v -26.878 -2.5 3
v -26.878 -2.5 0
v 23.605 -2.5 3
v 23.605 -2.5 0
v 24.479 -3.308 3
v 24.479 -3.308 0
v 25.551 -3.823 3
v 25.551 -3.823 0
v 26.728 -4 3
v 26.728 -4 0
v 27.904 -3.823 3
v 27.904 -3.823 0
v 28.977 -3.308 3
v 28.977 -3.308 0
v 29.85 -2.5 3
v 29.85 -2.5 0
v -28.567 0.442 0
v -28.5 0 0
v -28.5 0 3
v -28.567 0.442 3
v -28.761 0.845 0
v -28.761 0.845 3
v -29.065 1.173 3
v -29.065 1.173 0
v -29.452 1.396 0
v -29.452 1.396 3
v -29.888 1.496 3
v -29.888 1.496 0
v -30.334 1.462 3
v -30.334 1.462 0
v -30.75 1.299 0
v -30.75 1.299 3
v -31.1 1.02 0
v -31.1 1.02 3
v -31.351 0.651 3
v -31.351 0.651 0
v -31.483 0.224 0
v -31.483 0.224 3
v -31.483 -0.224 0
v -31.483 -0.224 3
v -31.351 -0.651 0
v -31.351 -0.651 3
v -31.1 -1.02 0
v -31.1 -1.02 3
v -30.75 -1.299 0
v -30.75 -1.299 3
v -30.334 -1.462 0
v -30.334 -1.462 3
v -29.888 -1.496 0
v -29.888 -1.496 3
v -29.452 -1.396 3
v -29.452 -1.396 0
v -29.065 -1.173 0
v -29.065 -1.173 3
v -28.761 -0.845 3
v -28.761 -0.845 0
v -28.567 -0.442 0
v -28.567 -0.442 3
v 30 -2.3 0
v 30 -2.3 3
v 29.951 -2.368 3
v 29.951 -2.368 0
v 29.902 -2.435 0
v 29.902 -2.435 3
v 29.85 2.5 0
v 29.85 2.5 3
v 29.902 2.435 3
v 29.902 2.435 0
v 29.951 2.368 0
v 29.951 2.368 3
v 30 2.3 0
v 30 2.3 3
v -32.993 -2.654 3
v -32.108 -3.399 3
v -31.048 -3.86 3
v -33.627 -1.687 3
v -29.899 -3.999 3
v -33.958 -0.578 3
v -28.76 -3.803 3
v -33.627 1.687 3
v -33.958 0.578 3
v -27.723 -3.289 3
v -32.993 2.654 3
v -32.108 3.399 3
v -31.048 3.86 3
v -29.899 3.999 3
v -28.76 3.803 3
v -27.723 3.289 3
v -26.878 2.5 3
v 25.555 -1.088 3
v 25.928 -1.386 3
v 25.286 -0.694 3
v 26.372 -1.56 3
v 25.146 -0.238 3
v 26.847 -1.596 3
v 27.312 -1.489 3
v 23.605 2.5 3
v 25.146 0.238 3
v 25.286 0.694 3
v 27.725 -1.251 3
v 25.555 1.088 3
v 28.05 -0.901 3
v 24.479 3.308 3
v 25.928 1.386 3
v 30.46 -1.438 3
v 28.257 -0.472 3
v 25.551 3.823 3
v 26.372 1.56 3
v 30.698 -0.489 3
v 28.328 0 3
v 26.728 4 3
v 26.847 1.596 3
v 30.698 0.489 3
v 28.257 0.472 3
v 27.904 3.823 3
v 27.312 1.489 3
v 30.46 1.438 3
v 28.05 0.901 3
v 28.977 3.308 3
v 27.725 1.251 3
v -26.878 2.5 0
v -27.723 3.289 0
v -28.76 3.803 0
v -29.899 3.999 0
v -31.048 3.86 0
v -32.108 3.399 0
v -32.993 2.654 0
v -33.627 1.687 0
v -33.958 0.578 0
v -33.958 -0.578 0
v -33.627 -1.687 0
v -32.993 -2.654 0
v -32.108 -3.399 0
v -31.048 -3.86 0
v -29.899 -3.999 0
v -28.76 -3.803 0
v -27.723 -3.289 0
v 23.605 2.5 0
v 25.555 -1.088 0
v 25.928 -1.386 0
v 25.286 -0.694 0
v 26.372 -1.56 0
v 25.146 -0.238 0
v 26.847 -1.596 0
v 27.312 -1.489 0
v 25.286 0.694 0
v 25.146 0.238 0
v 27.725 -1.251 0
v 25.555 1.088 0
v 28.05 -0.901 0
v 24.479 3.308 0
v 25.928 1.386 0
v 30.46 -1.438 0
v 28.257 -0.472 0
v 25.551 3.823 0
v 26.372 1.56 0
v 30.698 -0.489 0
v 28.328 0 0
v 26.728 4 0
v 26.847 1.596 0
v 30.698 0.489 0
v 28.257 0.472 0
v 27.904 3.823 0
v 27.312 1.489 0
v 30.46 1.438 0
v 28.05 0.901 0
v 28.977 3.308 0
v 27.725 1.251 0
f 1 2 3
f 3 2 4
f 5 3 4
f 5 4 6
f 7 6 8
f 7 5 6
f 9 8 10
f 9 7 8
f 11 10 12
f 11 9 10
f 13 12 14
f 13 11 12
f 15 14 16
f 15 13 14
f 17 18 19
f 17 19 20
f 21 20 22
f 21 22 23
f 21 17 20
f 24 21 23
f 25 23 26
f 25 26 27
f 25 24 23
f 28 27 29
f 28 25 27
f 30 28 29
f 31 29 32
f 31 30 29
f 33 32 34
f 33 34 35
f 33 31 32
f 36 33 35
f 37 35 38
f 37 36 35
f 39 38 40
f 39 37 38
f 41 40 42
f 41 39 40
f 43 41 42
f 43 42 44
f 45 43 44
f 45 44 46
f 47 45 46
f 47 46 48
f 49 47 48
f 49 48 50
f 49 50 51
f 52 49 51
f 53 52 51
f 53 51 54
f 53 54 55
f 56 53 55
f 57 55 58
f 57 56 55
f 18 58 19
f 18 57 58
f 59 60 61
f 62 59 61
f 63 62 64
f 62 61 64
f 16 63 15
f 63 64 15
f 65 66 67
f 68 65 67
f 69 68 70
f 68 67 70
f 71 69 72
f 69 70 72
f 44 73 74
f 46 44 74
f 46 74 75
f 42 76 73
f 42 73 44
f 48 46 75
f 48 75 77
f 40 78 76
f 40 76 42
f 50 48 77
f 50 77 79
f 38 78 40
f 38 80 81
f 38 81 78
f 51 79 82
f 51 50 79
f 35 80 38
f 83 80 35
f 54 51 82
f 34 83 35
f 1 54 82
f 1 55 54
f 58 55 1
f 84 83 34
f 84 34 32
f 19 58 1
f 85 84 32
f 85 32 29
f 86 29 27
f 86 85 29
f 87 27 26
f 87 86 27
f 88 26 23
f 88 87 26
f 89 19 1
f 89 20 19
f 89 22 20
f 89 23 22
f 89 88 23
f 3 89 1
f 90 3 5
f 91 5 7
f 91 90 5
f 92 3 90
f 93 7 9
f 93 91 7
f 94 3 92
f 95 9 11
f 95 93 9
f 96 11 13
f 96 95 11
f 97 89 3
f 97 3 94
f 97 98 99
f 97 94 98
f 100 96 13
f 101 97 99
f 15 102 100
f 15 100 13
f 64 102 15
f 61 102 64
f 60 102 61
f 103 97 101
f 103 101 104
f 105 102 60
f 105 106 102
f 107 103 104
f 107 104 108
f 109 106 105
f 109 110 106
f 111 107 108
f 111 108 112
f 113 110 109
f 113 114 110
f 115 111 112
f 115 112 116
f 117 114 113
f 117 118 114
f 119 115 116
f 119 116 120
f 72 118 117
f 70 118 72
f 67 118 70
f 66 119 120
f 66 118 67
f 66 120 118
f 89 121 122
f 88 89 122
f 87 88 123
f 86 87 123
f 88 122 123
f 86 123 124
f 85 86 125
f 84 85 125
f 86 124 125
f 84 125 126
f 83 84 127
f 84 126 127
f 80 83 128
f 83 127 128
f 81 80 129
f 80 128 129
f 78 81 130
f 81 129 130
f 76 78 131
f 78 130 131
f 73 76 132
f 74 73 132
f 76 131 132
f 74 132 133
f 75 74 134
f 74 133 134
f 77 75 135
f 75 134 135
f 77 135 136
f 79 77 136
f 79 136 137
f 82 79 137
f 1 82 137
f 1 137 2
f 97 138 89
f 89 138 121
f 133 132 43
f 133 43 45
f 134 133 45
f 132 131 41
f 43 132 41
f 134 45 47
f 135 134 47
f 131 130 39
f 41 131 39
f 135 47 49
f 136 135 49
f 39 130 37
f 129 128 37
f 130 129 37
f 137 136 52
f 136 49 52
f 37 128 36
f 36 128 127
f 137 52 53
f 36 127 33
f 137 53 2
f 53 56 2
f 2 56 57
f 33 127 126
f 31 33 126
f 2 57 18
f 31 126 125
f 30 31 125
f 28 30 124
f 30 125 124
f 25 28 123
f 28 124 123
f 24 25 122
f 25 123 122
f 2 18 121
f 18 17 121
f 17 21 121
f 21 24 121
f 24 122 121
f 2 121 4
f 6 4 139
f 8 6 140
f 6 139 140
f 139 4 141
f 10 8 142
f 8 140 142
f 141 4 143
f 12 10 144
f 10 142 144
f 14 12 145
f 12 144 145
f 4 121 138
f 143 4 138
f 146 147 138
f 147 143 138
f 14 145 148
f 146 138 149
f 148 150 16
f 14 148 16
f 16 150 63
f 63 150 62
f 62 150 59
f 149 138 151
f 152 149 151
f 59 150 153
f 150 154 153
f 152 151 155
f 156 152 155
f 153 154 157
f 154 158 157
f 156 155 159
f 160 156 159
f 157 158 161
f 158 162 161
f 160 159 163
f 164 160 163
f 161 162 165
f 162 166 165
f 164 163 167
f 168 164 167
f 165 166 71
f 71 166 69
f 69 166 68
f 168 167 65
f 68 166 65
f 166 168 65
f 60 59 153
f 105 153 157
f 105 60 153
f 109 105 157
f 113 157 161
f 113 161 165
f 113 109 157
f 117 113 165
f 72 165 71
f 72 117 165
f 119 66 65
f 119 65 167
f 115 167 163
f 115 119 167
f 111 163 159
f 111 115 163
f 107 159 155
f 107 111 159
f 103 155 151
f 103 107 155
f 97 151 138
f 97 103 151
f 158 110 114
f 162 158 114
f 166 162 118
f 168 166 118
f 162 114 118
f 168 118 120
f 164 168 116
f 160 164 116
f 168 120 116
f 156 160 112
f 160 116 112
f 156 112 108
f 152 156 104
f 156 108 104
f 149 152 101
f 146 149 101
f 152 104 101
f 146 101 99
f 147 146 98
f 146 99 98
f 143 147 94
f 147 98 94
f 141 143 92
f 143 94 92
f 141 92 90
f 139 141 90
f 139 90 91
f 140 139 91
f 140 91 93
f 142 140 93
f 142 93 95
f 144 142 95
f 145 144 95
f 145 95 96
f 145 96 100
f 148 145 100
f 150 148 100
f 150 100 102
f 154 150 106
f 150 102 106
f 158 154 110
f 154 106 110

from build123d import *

# Parameters (mm, degrees)
SKETCH1_R           = 1.5
BOSS_EXTRUDE1_DEPTH = 3
SKETCH3_R           = 1.6
CUT_EXTRUDE1_DEPTH  = 3
SKETCH4_R           = 4
SKETCH4_R_2         = 1.6
BOSS_EXTRUDE2_DEPTH = 3
CUT_EXTRUDE2_DEPTH  = 3


with BuildPart() as part:
    # Sketch1 → Boss-Extrude1 (new body)
    with BuildSketch(Plane.XY):
        with BuildLine():
            Line((-26.877501001, -2.5), (30, -2.5))
            Line((30, -2.5), (30, 2.5))
            Line((30, 2.5), (-26.877501001, 2.5))
            ThreePointArc((-26.877501001, 2.5), (-34, 0), (-26.877501001, -2.5))
        make_face()
        with Locations((-30, 0)):
            Circle(SKETCH1_R, mode=Mode.SUBTRACT)
    extrude(amount=BOSS_EXTRUDE1_DEPTH)

    # Sketch3 → Cut-Extrude1 (cut)
    with BuildSketch(Plane.XY.offset(3)):
        with Locations((26.727711113, 0)):
            Circle(SKETCH3_R)
    extrude(amount=-CUT_EXTRUDE1_DEPTH, mode=Mode.SUBTRACT)

    # Sketch4 → Boss-Extrude2 (add)
    with BuildSketch(Plane.XY.offset(3)):
        with Locations((26.727711113, 0)):
            Circle(SKETCH4_R)
        with Locations((26.727711113, 0)):
            Circle(SKETCH4_R_2, mode=Mode.SUBTRACT)
    extrude(amount=-BOSS_EXTRUDE2_DEPTH)

    # Sketch5 → Cut-Extrude2 (cut)
    with BuildSketch(Plane.XY.offset(3)):
        with BuildLine():
            Line((30, 2.5), (29.850210112, 2.5))
            ThreePointArc((29.850210112, 2.5), (29.926661234, 2.4013992), (30, 2.300462005))
            Line((30, 2.300462005), (30, 2.5))
        make_face()
        with BuildLine():
            Line((30, -2.5), (30, -2.300462005))
            ThreePointArc((30, -2.300462005), (29.926661234, -2.4013992), (29.850210112, -2.5))
            Line((29.850210112, -2.5), (30, -2.5))
        make_face()
    extrude(amount=-CUT_EXTRUDE2_DEPTH, mode=Mode.SUBTRACT)


solid = part.part
